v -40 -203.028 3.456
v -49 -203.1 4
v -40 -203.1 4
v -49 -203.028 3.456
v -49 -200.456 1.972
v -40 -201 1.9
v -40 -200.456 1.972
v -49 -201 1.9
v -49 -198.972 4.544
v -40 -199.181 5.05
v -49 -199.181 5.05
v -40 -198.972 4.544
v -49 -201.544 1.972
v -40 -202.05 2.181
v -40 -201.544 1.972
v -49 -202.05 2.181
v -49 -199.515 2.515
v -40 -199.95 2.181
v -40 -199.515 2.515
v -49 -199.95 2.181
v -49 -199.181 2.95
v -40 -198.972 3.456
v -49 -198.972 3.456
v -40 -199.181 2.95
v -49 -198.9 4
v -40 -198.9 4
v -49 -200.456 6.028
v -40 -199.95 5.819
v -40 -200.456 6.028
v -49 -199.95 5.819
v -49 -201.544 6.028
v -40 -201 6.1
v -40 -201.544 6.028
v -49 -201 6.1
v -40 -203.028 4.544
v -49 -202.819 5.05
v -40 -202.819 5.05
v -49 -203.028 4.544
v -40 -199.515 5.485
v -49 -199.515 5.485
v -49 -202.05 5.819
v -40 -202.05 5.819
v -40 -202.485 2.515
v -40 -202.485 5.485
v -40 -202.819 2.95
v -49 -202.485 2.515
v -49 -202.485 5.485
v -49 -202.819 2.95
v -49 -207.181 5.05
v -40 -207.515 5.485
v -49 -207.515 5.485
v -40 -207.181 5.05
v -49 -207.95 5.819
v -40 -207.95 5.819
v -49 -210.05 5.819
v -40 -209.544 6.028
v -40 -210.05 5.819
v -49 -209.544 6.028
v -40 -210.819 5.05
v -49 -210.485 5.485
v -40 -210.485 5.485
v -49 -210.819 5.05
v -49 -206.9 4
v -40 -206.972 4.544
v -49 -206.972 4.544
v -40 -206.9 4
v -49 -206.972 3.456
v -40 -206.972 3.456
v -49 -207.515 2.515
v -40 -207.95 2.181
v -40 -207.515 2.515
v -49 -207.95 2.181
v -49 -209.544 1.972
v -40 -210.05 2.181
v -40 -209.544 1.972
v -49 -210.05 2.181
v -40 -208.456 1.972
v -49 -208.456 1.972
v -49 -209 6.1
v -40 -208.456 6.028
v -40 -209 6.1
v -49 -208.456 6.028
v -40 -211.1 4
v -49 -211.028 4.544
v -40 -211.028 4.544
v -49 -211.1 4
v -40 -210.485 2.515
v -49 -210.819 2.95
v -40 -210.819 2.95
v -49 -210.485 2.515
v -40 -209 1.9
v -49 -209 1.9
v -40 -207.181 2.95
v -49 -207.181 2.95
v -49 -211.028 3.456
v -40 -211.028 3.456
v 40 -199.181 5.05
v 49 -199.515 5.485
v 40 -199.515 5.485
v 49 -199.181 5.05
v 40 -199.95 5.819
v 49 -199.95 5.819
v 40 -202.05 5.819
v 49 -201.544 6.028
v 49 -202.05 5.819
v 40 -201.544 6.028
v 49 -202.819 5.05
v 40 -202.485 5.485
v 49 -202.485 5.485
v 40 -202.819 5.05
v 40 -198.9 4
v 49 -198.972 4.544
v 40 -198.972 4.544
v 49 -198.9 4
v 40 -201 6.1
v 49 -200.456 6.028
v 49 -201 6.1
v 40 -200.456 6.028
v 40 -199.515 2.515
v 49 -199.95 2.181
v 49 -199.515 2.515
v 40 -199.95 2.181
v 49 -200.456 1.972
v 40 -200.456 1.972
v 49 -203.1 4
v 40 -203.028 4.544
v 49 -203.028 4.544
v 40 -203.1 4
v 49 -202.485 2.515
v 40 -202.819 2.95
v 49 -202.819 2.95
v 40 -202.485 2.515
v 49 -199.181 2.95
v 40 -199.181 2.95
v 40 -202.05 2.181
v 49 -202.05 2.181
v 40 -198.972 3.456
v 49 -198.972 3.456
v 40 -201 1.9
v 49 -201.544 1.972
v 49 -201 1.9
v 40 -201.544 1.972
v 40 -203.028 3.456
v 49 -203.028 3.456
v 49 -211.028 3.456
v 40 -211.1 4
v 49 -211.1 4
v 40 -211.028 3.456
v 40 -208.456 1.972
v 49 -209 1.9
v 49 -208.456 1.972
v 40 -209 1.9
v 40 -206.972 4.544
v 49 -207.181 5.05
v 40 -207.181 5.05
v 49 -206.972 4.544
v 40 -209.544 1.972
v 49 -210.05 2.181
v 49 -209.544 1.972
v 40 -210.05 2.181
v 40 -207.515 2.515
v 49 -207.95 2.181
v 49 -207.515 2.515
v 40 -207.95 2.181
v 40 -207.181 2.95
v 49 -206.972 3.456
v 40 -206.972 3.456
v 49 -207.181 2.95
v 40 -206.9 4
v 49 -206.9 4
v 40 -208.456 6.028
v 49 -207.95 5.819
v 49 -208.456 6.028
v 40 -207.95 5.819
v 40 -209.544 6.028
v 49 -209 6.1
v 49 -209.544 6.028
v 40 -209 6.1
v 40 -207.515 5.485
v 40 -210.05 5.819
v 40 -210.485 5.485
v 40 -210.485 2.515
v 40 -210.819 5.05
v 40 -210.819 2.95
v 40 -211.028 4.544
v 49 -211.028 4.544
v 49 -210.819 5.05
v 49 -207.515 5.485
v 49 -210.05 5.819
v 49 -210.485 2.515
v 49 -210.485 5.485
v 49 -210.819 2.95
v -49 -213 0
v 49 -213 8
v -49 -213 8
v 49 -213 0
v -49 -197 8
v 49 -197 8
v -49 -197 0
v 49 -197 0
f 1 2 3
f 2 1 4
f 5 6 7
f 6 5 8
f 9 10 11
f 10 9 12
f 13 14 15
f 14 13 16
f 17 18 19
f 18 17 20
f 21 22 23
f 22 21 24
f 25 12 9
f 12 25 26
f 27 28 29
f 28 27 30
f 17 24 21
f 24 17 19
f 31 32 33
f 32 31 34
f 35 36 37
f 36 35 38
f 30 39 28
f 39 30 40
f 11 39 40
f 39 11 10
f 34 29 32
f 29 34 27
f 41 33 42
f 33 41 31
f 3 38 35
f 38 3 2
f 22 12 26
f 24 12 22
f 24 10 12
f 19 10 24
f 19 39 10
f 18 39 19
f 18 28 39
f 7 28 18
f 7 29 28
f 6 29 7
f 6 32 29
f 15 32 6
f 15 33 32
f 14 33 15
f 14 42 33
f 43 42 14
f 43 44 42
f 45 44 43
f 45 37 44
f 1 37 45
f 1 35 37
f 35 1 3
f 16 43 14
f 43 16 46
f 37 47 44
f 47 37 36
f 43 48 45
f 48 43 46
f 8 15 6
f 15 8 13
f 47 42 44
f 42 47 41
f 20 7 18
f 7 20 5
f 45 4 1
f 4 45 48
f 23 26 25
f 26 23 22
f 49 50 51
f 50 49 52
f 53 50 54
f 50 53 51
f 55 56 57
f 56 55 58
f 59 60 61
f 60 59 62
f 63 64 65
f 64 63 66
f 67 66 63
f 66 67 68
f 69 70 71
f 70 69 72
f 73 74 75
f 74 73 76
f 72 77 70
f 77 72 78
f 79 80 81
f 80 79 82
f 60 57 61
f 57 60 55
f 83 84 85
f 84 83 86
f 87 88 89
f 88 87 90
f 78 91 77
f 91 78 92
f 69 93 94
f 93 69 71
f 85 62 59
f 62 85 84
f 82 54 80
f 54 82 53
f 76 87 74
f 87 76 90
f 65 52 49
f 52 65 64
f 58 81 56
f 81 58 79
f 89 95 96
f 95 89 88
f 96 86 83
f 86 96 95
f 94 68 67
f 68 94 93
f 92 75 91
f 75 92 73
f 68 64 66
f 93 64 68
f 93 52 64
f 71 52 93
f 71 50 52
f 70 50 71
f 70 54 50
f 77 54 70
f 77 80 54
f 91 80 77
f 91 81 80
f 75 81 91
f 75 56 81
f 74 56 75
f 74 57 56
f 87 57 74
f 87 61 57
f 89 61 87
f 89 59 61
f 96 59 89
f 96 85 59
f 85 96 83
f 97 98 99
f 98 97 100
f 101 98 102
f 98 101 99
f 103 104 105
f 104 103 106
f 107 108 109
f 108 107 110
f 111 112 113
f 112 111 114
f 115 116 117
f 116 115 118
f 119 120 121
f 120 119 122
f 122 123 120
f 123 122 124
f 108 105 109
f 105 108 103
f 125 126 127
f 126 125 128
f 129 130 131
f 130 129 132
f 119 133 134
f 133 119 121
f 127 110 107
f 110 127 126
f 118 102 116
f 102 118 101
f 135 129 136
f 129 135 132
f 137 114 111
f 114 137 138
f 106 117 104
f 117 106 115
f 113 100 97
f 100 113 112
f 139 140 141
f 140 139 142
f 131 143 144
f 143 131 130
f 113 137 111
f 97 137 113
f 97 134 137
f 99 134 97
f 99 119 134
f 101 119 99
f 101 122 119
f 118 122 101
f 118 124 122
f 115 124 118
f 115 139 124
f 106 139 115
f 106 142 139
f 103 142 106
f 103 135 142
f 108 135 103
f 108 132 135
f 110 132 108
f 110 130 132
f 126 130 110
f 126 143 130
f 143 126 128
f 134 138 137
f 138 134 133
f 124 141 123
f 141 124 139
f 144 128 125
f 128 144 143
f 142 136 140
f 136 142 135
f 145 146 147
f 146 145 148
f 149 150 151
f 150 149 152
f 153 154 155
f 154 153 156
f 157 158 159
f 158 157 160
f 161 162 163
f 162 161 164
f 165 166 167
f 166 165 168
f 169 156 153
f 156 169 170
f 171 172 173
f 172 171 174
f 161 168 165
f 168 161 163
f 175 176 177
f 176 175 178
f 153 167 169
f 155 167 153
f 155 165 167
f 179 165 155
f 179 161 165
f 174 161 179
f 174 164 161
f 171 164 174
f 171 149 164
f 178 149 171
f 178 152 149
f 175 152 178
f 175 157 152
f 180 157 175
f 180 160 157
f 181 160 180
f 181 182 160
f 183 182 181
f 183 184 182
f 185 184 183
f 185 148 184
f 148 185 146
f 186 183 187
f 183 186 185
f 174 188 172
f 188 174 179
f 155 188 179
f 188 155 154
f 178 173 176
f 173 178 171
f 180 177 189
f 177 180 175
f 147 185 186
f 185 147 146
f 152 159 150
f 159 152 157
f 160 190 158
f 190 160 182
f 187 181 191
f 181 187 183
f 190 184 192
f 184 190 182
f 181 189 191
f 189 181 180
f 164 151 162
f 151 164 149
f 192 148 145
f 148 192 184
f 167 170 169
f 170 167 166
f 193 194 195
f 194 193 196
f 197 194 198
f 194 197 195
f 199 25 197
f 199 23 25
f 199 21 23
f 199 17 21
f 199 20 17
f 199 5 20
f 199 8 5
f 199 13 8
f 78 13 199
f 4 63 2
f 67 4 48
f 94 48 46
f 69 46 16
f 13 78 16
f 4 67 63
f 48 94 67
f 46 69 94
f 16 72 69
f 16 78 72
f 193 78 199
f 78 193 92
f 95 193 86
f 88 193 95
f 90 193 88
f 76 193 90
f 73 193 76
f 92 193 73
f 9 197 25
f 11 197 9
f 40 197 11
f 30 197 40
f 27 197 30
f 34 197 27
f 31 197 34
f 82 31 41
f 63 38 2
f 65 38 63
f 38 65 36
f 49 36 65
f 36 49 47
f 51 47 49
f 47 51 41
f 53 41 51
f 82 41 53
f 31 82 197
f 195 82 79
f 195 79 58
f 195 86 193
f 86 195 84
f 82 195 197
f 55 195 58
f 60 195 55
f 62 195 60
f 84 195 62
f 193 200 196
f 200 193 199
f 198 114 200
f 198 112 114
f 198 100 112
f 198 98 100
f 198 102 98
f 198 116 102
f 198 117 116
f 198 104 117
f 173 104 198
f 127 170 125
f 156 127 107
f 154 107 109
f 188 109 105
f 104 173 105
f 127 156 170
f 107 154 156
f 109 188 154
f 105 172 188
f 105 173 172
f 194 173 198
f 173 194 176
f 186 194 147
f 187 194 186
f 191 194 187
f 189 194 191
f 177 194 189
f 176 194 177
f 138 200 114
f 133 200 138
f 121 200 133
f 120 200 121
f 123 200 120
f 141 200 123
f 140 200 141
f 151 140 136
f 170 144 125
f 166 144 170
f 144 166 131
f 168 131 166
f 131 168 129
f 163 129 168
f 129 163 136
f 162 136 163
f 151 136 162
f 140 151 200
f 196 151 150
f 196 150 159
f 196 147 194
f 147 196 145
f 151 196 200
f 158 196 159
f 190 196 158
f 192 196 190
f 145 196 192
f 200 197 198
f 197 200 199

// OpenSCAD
include <../lib/meshtastic-drybag-node-lib.scad>;
$fn = 40;
bridge_print(false);
